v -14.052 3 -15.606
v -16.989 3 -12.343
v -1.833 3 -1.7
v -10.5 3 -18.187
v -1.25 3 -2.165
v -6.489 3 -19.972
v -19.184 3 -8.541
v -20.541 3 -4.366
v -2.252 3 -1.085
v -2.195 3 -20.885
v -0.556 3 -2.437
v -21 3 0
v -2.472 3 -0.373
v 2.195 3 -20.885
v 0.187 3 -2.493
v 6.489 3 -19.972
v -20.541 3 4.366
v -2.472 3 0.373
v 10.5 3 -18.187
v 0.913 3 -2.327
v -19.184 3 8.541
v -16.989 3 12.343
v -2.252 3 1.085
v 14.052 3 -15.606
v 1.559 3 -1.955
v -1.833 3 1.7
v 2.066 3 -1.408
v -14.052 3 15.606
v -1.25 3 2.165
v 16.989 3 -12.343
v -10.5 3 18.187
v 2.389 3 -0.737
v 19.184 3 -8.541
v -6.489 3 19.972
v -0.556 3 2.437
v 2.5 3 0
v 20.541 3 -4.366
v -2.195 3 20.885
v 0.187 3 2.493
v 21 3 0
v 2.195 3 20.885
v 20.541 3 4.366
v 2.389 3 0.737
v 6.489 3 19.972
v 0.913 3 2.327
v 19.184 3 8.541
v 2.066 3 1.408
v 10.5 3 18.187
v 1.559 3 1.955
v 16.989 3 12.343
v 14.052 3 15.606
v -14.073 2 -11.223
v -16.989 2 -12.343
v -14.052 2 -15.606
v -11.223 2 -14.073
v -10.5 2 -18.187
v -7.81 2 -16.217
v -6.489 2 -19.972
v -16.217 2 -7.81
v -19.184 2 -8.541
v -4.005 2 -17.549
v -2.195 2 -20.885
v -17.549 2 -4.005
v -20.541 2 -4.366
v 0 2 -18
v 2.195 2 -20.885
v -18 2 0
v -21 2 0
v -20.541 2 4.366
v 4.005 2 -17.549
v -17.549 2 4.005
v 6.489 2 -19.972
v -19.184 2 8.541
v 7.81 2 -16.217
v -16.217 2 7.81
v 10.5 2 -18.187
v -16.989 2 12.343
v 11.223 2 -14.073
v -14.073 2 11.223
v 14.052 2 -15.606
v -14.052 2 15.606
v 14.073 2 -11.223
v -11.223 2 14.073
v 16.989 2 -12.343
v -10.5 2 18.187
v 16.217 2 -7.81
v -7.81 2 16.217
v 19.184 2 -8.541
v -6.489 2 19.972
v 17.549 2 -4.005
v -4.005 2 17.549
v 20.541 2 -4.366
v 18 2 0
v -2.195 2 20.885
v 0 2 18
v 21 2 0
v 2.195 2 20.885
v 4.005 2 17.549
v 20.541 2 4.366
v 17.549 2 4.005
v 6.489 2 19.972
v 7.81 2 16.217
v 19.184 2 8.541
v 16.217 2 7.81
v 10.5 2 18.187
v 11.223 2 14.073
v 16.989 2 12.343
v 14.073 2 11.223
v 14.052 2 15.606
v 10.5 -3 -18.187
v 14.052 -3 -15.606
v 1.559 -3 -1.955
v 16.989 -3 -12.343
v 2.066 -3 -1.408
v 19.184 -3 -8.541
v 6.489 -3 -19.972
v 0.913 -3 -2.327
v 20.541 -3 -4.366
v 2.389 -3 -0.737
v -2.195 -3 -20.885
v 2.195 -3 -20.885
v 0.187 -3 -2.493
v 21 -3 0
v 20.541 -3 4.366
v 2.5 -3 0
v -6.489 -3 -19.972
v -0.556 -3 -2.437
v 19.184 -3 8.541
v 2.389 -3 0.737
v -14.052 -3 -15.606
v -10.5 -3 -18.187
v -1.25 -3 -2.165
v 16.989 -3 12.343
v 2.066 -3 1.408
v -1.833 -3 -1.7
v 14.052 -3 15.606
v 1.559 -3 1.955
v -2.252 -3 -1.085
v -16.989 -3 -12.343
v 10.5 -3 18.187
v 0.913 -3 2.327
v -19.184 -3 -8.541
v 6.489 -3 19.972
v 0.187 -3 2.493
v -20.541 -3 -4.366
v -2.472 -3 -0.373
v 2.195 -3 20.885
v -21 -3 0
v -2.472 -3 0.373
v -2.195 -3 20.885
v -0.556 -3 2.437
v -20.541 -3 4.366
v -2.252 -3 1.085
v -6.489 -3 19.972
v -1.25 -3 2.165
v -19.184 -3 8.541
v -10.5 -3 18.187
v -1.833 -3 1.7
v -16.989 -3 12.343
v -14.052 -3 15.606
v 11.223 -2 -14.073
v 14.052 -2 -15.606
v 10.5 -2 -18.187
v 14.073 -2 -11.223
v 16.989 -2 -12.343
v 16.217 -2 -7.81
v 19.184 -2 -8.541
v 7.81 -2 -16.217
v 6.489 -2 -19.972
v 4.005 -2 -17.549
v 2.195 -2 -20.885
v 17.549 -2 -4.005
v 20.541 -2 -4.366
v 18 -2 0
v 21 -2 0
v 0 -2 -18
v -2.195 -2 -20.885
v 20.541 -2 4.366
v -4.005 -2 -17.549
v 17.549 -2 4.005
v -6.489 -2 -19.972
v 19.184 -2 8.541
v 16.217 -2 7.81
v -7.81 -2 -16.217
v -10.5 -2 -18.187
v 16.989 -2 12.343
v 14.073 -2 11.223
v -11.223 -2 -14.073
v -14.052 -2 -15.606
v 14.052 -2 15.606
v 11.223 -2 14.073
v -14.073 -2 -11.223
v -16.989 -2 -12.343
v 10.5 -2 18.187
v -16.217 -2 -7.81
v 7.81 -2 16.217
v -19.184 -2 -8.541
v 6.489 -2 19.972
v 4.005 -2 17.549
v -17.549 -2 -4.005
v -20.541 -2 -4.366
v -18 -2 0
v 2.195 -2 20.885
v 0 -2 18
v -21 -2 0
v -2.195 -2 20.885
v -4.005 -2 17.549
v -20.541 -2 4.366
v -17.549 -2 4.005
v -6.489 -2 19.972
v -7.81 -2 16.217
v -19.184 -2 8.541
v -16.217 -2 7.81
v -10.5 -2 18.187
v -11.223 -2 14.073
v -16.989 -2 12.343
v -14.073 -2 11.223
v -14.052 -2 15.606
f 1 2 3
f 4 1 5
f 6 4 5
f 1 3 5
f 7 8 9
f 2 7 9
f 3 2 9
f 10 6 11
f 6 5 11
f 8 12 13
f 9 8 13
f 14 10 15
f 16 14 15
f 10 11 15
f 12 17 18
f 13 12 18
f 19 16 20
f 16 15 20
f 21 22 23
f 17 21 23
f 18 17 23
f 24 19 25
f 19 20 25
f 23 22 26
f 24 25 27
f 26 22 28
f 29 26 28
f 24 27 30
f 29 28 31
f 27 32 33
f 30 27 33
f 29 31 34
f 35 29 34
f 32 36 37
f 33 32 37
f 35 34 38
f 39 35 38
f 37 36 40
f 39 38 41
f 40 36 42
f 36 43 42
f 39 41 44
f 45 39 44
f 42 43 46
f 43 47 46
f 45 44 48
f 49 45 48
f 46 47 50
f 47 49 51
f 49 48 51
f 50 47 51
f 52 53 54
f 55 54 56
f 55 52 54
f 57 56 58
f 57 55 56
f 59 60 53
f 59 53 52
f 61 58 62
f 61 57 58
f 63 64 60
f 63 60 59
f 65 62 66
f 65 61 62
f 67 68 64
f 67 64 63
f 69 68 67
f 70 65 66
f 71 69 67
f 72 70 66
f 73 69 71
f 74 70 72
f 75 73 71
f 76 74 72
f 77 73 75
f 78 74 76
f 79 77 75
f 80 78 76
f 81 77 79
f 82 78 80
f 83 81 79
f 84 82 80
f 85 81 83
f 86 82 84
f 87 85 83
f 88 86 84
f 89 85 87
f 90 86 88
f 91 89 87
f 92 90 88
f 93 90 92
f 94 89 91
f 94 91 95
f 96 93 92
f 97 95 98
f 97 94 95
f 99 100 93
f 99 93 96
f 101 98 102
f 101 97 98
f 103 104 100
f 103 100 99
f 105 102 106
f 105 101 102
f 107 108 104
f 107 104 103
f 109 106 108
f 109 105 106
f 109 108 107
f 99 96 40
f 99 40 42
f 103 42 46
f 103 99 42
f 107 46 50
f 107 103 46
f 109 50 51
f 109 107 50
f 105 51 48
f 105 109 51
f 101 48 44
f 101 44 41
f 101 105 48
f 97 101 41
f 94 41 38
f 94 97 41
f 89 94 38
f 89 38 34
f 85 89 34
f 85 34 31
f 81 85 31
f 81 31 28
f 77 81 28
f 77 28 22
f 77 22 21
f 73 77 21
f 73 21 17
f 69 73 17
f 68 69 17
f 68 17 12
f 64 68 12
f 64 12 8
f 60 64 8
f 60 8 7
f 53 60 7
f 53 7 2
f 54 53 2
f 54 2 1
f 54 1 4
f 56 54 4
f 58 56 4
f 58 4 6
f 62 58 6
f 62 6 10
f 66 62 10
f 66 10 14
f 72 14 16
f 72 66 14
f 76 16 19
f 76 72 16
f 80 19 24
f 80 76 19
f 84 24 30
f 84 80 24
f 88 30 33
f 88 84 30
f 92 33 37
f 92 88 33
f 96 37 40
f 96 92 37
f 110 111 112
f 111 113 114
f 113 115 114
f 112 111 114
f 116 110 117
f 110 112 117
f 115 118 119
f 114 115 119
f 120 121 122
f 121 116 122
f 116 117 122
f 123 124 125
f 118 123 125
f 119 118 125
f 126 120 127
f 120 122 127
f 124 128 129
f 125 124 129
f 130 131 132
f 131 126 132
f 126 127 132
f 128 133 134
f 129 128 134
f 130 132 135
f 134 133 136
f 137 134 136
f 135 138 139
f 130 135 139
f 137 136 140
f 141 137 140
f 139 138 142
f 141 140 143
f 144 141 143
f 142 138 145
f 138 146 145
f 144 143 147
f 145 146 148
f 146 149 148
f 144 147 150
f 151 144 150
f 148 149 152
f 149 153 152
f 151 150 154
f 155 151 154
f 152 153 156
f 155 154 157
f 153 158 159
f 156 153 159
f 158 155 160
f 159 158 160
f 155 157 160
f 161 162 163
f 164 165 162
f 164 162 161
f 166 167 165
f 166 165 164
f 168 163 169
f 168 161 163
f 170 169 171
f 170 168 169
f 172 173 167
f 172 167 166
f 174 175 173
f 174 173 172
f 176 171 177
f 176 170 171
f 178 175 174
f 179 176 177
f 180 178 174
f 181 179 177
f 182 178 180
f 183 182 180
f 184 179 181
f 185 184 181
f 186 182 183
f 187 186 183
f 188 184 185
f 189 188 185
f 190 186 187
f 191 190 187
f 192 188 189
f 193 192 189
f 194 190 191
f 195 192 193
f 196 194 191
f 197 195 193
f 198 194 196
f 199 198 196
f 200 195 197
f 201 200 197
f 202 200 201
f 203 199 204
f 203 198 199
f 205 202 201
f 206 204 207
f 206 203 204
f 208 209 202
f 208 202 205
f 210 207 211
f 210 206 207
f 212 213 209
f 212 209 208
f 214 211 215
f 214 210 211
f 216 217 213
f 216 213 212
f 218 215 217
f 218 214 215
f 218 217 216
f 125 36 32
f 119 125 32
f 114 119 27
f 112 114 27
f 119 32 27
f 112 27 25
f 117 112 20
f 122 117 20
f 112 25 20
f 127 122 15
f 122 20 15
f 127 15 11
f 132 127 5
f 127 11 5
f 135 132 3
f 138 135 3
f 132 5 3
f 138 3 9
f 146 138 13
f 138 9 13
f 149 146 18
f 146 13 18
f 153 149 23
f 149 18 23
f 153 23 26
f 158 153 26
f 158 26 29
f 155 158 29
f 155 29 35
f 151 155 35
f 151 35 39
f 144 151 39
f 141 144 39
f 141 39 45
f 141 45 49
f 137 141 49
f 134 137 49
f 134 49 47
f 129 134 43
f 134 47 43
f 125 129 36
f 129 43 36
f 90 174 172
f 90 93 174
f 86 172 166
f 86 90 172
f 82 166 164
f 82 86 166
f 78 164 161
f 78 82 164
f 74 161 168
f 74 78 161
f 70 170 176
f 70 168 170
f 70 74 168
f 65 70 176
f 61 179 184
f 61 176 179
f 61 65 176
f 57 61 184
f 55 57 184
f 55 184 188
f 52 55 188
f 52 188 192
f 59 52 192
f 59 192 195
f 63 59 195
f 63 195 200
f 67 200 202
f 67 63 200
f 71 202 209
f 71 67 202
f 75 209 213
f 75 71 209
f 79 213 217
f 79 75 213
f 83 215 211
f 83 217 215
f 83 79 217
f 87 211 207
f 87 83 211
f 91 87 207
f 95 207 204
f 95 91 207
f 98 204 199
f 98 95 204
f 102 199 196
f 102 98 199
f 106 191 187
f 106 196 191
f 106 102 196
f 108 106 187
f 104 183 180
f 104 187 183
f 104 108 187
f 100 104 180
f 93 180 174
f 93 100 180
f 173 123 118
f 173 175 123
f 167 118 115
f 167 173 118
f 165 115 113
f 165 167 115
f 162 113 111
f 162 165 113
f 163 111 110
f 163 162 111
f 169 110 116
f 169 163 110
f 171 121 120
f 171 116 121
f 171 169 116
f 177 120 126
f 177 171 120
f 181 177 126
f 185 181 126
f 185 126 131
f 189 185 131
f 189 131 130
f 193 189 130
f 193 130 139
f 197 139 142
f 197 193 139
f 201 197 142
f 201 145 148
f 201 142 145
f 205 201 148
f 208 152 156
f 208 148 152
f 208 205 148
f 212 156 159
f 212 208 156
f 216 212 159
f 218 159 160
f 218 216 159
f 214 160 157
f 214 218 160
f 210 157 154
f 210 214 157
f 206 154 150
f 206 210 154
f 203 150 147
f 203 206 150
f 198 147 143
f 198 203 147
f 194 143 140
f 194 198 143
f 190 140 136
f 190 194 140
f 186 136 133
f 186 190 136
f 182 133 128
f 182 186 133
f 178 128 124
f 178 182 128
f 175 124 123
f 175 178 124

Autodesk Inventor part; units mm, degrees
ref_plane "YZ Plane" through (0, 0, 0) normal (1, 0, 0) x (0, 1, 0)
ref_plane "XZ Plane" through (0, 0, 0) normal (0, 1, 0) x (-1, 0, 0)
ref_plane "XY Plane" through (0, 0, 0) normal (0, 0, 1) x (1, 0, 0)
sketch "Sketch1" plane through (0, 0, 0) normal (0, 0, 1) x (1, 0, 0)
  line L0 (0, 0) -> (18, 0)
  line L1 (18, 0) -> (18, 3)
  line L2 (18, 3) -> (0, 3)
  line L3 (0, 3) -> (0, 0)
  line L4 (0, 3) -> (21, 3)
  line L5 (21, 3) -> (21, 2)
  line L6 (21, 2) -> (0, 2)
  line L7 (0, 2) -> (0, 3)
  point P0 (18, 2)
  dimension "d0" = 18
  dimension "d1" = 3
  dimension "d2" = 21
  dimension "d3" = 1
revolve "Revolution1" add sketch "Sketch1" angle 360 about axis through (0, 3, 0) along (0, -1, 0)
mirror "Mirror1" about plane through (0, 0, 0) normal (0, 1, 0) of "Revolution1"
sketch "Sketch2" plane through (0, 3, 0) normal (0, 1, 0) x (1, 0, 0)
  circle A0 centre (0, 0) radius 2.5
  dimension "d5" = 5
extrude "Extrusion1" cut sketch "Sketch2" against normal blind 10
properties part number "servo_pulley"
